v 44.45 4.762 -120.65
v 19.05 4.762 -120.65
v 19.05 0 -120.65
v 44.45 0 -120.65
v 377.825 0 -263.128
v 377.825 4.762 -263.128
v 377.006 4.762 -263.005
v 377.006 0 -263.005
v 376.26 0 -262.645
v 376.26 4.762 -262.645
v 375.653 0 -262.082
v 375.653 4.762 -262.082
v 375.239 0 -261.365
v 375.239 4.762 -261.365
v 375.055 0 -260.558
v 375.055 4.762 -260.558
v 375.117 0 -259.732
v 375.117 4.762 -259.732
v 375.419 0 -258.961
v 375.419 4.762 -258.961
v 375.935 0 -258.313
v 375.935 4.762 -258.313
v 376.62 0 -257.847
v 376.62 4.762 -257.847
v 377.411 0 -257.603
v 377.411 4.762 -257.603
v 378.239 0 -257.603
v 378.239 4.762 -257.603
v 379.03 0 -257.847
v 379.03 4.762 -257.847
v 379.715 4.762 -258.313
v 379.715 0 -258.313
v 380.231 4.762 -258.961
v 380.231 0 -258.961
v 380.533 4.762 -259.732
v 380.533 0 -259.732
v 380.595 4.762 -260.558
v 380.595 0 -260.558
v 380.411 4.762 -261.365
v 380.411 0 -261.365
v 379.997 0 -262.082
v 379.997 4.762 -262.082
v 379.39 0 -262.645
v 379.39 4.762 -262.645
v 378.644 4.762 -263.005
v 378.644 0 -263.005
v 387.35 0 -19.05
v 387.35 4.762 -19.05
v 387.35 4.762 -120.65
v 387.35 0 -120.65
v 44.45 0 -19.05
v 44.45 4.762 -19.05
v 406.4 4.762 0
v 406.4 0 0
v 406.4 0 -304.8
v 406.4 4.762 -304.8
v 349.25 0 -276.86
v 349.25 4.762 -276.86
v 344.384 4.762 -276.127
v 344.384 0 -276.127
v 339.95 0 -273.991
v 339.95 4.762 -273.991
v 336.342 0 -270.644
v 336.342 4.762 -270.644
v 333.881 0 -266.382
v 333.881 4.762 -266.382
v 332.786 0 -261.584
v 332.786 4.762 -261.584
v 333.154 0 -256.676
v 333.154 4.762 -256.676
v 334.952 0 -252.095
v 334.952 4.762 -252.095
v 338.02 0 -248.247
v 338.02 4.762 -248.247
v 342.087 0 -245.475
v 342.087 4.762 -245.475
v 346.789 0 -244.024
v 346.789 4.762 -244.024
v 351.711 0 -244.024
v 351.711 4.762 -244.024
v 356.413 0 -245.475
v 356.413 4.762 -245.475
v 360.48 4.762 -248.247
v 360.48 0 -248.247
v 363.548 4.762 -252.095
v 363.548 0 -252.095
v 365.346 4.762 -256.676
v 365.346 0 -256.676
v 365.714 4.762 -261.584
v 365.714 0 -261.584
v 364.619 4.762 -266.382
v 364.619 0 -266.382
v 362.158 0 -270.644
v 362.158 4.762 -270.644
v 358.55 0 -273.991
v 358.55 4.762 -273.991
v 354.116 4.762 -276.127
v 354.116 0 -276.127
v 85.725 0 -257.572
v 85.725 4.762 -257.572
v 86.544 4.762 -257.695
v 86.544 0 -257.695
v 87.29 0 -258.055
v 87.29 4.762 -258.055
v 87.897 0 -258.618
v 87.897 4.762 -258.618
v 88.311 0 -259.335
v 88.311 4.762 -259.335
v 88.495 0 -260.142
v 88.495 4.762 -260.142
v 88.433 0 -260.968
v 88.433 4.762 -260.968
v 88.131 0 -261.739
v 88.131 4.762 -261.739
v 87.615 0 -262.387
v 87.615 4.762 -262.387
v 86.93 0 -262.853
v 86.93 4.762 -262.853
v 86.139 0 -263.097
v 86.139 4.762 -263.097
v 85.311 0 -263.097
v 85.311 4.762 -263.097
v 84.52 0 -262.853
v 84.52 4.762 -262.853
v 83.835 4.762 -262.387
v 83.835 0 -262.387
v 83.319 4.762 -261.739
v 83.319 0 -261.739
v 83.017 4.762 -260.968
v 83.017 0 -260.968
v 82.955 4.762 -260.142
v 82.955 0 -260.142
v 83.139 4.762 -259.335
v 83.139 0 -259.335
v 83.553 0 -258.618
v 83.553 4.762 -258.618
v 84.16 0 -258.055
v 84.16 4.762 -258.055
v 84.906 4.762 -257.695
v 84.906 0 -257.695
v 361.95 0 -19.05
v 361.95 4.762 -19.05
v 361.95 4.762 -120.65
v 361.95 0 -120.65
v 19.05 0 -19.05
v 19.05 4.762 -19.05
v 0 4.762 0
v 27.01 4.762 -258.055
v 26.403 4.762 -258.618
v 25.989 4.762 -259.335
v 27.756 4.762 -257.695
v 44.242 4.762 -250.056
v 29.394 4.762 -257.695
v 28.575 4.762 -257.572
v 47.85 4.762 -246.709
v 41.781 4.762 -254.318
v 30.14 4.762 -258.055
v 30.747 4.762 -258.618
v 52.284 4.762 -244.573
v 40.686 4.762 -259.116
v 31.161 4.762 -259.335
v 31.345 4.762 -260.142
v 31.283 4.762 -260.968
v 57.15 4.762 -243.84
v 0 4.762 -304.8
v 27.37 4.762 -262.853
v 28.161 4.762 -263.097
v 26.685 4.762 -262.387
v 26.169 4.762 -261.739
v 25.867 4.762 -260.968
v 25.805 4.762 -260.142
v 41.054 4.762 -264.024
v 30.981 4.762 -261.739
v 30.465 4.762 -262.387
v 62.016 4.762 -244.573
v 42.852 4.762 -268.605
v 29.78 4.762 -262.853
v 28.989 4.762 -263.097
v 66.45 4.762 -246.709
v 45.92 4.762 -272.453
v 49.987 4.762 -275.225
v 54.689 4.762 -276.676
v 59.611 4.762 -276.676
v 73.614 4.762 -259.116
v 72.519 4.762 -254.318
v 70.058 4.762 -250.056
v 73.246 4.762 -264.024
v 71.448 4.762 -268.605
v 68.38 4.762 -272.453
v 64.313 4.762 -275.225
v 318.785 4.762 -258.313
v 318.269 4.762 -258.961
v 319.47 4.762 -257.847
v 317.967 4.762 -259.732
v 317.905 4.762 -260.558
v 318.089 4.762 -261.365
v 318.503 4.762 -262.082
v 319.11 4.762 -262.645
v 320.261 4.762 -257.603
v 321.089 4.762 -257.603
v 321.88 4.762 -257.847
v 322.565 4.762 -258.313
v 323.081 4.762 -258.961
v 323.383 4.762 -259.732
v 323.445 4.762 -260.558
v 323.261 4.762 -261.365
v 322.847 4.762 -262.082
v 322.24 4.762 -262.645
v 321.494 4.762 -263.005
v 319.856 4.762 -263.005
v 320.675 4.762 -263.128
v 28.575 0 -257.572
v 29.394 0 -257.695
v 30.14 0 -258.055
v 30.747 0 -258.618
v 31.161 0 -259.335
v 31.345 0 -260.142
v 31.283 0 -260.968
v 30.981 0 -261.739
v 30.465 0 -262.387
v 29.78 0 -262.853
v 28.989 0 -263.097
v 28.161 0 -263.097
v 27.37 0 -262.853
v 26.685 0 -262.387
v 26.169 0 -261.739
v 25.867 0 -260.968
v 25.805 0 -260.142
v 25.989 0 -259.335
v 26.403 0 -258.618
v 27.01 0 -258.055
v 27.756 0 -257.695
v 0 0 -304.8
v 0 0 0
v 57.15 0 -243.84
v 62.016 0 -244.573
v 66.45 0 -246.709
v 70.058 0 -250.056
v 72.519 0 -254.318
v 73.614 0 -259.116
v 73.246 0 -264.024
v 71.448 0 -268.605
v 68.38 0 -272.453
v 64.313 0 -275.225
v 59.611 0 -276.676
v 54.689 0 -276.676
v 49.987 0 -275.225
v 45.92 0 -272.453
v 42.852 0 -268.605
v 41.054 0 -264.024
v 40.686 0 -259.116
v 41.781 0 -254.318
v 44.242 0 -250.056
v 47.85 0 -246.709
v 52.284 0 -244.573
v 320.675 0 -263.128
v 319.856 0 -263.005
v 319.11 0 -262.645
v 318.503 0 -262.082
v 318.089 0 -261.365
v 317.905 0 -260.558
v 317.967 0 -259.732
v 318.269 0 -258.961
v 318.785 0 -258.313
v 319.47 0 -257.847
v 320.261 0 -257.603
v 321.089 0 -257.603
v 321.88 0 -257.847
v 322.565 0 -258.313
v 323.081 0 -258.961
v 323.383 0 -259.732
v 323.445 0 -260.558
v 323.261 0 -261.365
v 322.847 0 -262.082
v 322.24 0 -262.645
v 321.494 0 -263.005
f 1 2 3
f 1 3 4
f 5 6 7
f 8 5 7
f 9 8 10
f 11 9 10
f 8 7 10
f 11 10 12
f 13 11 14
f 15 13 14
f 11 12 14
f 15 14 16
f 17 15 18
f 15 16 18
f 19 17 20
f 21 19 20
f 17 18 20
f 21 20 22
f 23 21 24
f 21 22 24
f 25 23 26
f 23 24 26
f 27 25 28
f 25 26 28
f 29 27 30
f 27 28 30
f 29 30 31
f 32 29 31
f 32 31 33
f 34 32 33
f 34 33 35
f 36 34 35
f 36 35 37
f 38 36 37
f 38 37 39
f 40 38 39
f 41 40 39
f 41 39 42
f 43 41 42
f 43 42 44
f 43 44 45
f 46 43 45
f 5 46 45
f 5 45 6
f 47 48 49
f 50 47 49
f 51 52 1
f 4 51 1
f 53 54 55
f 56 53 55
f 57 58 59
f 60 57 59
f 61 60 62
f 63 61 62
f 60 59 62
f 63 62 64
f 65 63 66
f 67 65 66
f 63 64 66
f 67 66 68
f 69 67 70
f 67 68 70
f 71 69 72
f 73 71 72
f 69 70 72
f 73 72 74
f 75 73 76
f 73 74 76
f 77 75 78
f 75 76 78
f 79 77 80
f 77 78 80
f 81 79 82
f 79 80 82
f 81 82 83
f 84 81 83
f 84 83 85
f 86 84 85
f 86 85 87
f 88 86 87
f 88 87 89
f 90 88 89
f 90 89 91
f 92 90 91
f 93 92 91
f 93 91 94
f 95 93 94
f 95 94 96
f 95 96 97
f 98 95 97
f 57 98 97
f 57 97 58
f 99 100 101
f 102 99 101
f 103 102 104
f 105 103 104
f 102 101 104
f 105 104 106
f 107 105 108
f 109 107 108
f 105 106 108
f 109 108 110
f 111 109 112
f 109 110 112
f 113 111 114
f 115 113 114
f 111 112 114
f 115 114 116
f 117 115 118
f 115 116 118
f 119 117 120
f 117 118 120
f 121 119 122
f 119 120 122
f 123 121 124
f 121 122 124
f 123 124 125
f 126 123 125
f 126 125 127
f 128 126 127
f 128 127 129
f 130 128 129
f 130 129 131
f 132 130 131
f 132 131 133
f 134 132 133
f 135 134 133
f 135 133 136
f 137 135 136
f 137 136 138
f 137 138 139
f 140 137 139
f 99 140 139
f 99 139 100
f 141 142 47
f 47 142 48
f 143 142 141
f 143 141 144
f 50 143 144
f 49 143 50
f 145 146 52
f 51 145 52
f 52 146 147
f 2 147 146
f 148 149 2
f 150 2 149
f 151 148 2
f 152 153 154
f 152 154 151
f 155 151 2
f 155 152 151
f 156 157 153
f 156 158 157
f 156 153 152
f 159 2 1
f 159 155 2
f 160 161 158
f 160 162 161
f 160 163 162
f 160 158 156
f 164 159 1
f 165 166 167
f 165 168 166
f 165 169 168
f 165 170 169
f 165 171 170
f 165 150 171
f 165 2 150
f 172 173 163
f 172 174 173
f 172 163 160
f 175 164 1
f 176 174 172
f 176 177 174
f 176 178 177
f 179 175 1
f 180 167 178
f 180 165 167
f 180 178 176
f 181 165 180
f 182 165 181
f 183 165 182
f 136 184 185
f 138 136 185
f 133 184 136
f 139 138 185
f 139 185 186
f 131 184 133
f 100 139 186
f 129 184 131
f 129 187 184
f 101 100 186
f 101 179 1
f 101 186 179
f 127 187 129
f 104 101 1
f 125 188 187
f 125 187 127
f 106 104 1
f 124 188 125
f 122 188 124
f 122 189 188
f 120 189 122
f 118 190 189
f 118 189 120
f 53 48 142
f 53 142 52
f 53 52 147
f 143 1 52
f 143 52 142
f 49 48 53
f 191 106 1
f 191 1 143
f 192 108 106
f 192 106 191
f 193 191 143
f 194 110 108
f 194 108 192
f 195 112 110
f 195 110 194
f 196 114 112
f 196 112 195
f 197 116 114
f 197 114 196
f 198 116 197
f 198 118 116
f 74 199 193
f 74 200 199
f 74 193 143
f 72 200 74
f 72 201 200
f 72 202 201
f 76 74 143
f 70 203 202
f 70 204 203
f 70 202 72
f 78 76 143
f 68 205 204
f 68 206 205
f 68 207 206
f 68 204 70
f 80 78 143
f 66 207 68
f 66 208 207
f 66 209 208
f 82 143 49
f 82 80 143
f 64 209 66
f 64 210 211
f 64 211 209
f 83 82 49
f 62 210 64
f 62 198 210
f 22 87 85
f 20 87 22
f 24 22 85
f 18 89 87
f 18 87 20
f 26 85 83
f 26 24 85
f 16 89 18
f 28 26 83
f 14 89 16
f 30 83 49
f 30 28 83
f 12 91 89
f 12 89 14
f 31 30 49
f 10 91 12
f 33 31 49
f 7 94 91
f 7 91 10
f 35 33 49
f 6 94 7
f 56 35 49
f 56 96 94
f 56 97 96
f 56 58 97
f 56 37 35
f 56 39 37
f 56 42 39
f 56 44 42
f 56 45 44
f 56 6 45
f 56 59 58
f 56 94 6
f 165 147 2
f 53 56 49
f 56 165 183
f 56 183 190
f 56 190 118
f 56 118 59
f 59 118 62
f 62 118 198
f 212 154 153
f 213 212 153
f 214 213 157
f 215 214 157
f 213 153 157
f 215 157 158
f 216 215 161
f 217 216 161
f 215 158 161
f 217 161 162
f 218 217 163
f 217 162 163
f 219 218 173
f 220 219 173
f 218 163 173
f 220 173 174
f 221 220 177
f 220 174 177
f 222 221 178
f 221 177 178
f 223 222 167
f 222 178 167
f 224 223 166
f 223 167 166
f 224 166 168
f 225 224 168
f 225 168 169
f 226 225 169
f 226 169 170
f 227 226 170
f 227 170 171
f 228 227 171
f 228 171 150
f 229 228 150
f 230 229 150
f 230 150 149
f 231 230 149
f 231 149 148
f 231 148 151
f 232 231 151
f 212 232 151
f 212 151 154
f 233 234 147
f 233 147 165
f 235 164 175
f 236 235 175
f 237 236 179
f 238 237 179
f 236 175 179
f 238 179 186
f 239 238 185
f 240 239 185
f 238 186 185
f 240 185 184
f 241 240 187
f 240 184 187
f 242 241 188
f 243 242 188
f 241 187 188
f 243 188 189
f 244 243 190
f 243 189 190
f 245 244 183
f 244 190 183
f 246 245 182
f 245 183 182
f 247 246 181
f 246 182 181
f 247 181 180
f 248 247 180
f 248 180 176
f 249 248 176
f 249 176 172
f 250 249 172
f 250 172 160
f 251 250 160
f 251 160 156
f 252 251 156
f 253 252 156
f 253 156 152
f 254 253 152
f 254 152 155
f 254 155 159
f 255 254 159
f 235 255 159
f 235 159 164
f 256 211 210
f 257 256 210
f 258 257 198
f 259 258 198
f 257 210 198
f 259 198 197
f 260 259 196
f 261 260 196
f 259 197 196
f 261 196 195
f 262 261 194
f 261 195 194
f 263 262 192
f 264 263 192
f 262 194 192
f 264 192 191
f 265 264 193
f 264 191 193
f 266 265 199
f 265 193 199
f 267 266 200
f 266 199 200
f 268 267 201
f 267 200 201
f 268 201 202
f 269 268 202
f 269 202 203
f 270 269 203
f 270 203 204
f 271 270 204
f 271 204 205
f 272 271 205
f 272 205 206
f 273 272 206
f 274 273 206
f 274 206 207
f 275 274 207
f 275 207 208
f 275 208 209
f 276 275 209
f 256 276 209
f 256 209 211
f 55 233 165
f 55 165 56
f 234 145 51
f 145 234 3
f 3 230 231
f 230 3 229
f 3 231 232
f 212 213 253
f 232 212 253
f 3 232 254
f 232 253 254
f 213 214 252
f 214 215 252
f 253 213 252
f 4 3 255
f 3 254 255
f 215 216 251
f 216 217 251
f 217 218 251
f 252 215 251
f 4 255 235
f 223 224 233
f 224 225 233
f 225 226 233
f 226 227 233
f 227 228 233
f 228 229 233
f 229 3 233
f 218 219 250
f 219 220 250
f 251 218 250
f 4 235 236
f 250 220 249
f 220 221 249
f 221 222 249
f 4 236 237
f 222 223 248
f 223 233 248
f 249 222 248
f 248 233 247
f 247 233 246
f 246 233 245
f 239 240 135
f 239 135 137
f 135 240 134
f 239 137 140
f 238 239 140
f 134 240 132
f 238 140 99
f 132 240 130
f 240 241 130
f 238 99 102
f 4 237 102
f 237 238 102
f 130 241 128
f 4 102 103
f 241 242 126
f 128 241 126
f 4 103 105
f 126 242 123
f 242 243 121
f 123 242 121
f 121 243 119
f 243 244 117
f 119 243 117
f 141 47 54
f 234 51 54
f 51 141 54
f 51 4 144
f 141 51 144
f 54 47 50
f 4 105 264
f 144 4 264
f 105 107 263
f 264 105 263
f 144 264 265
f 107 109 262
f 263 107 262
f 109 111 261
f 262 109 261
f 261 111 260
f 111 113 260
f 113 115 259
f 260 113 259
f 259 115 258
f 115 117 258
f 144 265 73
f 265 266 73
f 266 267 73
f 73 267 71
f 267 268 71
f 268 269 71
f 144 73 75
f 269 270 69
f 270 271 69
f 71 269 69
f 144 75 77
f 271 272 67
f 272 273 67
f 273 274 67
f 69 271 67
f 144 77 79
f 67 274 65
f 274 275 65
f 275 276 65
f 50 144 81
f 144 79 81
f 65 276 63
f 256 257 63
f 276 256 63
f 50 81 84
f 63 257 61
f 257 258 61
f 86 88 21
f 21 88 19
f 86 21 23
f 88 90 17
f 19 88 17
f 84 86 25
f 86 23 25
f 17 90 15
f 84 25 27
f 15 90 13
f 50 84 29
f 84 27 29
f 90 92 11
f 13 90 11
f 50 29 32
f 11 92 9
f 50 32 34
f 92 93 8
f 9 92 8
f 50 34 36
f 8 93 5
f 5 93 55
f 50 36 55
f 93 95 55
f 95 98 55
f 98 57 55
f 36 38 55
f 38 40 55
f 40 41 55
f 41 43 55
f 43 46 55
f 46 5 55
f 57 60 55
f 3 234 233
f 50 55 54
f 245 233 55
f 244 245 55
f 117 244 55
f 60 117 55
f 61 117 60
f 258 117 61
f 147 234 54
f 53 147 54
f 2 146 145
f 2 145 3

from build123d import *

# Parameters (mm, degrees)
SKETCH1_W           = 406.4
SKETCH1_H           = 304.8
BOSS_EXTRUDE1_DEPTH = 4.7625
SKETCH2_R           = 16.51
SKETCH2_R_2         = 2.778125
SKETCH2_W           = 25.4
SKETCH2_H           = 101.6
CUT_EXTRUDE1_DEPTH  = 6.35


with BuildPart() as part:
    # Sketch1 → Boss-Extrude1 (new body)
    with BuildSketch(Plane(origin=(0, 0, 0), x_dir=(1, 0, 0), z_dir=(0, 1, 0))):
        with Locations((203.2, 152.4)):
            Rectangle(SKETCH1_W, SKETCH1_H)
    extrude(amount=BOSS_EXTRUDE1_DEPTH)

    # Sketch2 → Cut-Extrude1 (cut)
    with BuildSketch(Plane(origin=(0, 4.7625, 0), x_dir=(1, 0, 0), z_dir=(0, 1, 0))):
        with Locations(Location((57.15, 260.35, 0), (0, 0, 270))):
            Circle(SKETCH2_R)
        with Locations(Location((85.725, 260.35, 0), (0, 0, 270))):
            Circle(SKETCH2_R_2)
        with Locations(Location((28.575, 260.35, 0), (0, 0, 270))):
            Circle(SKETCH2_R_2)
        with Locations(Location((377.825, 260.35, 0), (0, 0, 90))):
            Circle(SKETCH2_R_2)
        with Locations(Location((320.675, 260.35, 0), (0, 0, 90))):
            Circle(SKETCH2_R_2)
        with Locations(Location((349.25, 260.35, 0), (0, 0, 90))):
            Circle(SKETCH2_R)
        with Locations((31.75, 69.85)):
            Rectangle(SKETCH2_W, SKETCH2_H)
        with Locations((374.65, 69.85)):
            Rectangle(SKETCH2_W, SKETCH2_H)
    extrude(amount=-CUT_EXTRUDE1_DEPTH, mode=Mode.SUBTRACT)


solid = part.part
